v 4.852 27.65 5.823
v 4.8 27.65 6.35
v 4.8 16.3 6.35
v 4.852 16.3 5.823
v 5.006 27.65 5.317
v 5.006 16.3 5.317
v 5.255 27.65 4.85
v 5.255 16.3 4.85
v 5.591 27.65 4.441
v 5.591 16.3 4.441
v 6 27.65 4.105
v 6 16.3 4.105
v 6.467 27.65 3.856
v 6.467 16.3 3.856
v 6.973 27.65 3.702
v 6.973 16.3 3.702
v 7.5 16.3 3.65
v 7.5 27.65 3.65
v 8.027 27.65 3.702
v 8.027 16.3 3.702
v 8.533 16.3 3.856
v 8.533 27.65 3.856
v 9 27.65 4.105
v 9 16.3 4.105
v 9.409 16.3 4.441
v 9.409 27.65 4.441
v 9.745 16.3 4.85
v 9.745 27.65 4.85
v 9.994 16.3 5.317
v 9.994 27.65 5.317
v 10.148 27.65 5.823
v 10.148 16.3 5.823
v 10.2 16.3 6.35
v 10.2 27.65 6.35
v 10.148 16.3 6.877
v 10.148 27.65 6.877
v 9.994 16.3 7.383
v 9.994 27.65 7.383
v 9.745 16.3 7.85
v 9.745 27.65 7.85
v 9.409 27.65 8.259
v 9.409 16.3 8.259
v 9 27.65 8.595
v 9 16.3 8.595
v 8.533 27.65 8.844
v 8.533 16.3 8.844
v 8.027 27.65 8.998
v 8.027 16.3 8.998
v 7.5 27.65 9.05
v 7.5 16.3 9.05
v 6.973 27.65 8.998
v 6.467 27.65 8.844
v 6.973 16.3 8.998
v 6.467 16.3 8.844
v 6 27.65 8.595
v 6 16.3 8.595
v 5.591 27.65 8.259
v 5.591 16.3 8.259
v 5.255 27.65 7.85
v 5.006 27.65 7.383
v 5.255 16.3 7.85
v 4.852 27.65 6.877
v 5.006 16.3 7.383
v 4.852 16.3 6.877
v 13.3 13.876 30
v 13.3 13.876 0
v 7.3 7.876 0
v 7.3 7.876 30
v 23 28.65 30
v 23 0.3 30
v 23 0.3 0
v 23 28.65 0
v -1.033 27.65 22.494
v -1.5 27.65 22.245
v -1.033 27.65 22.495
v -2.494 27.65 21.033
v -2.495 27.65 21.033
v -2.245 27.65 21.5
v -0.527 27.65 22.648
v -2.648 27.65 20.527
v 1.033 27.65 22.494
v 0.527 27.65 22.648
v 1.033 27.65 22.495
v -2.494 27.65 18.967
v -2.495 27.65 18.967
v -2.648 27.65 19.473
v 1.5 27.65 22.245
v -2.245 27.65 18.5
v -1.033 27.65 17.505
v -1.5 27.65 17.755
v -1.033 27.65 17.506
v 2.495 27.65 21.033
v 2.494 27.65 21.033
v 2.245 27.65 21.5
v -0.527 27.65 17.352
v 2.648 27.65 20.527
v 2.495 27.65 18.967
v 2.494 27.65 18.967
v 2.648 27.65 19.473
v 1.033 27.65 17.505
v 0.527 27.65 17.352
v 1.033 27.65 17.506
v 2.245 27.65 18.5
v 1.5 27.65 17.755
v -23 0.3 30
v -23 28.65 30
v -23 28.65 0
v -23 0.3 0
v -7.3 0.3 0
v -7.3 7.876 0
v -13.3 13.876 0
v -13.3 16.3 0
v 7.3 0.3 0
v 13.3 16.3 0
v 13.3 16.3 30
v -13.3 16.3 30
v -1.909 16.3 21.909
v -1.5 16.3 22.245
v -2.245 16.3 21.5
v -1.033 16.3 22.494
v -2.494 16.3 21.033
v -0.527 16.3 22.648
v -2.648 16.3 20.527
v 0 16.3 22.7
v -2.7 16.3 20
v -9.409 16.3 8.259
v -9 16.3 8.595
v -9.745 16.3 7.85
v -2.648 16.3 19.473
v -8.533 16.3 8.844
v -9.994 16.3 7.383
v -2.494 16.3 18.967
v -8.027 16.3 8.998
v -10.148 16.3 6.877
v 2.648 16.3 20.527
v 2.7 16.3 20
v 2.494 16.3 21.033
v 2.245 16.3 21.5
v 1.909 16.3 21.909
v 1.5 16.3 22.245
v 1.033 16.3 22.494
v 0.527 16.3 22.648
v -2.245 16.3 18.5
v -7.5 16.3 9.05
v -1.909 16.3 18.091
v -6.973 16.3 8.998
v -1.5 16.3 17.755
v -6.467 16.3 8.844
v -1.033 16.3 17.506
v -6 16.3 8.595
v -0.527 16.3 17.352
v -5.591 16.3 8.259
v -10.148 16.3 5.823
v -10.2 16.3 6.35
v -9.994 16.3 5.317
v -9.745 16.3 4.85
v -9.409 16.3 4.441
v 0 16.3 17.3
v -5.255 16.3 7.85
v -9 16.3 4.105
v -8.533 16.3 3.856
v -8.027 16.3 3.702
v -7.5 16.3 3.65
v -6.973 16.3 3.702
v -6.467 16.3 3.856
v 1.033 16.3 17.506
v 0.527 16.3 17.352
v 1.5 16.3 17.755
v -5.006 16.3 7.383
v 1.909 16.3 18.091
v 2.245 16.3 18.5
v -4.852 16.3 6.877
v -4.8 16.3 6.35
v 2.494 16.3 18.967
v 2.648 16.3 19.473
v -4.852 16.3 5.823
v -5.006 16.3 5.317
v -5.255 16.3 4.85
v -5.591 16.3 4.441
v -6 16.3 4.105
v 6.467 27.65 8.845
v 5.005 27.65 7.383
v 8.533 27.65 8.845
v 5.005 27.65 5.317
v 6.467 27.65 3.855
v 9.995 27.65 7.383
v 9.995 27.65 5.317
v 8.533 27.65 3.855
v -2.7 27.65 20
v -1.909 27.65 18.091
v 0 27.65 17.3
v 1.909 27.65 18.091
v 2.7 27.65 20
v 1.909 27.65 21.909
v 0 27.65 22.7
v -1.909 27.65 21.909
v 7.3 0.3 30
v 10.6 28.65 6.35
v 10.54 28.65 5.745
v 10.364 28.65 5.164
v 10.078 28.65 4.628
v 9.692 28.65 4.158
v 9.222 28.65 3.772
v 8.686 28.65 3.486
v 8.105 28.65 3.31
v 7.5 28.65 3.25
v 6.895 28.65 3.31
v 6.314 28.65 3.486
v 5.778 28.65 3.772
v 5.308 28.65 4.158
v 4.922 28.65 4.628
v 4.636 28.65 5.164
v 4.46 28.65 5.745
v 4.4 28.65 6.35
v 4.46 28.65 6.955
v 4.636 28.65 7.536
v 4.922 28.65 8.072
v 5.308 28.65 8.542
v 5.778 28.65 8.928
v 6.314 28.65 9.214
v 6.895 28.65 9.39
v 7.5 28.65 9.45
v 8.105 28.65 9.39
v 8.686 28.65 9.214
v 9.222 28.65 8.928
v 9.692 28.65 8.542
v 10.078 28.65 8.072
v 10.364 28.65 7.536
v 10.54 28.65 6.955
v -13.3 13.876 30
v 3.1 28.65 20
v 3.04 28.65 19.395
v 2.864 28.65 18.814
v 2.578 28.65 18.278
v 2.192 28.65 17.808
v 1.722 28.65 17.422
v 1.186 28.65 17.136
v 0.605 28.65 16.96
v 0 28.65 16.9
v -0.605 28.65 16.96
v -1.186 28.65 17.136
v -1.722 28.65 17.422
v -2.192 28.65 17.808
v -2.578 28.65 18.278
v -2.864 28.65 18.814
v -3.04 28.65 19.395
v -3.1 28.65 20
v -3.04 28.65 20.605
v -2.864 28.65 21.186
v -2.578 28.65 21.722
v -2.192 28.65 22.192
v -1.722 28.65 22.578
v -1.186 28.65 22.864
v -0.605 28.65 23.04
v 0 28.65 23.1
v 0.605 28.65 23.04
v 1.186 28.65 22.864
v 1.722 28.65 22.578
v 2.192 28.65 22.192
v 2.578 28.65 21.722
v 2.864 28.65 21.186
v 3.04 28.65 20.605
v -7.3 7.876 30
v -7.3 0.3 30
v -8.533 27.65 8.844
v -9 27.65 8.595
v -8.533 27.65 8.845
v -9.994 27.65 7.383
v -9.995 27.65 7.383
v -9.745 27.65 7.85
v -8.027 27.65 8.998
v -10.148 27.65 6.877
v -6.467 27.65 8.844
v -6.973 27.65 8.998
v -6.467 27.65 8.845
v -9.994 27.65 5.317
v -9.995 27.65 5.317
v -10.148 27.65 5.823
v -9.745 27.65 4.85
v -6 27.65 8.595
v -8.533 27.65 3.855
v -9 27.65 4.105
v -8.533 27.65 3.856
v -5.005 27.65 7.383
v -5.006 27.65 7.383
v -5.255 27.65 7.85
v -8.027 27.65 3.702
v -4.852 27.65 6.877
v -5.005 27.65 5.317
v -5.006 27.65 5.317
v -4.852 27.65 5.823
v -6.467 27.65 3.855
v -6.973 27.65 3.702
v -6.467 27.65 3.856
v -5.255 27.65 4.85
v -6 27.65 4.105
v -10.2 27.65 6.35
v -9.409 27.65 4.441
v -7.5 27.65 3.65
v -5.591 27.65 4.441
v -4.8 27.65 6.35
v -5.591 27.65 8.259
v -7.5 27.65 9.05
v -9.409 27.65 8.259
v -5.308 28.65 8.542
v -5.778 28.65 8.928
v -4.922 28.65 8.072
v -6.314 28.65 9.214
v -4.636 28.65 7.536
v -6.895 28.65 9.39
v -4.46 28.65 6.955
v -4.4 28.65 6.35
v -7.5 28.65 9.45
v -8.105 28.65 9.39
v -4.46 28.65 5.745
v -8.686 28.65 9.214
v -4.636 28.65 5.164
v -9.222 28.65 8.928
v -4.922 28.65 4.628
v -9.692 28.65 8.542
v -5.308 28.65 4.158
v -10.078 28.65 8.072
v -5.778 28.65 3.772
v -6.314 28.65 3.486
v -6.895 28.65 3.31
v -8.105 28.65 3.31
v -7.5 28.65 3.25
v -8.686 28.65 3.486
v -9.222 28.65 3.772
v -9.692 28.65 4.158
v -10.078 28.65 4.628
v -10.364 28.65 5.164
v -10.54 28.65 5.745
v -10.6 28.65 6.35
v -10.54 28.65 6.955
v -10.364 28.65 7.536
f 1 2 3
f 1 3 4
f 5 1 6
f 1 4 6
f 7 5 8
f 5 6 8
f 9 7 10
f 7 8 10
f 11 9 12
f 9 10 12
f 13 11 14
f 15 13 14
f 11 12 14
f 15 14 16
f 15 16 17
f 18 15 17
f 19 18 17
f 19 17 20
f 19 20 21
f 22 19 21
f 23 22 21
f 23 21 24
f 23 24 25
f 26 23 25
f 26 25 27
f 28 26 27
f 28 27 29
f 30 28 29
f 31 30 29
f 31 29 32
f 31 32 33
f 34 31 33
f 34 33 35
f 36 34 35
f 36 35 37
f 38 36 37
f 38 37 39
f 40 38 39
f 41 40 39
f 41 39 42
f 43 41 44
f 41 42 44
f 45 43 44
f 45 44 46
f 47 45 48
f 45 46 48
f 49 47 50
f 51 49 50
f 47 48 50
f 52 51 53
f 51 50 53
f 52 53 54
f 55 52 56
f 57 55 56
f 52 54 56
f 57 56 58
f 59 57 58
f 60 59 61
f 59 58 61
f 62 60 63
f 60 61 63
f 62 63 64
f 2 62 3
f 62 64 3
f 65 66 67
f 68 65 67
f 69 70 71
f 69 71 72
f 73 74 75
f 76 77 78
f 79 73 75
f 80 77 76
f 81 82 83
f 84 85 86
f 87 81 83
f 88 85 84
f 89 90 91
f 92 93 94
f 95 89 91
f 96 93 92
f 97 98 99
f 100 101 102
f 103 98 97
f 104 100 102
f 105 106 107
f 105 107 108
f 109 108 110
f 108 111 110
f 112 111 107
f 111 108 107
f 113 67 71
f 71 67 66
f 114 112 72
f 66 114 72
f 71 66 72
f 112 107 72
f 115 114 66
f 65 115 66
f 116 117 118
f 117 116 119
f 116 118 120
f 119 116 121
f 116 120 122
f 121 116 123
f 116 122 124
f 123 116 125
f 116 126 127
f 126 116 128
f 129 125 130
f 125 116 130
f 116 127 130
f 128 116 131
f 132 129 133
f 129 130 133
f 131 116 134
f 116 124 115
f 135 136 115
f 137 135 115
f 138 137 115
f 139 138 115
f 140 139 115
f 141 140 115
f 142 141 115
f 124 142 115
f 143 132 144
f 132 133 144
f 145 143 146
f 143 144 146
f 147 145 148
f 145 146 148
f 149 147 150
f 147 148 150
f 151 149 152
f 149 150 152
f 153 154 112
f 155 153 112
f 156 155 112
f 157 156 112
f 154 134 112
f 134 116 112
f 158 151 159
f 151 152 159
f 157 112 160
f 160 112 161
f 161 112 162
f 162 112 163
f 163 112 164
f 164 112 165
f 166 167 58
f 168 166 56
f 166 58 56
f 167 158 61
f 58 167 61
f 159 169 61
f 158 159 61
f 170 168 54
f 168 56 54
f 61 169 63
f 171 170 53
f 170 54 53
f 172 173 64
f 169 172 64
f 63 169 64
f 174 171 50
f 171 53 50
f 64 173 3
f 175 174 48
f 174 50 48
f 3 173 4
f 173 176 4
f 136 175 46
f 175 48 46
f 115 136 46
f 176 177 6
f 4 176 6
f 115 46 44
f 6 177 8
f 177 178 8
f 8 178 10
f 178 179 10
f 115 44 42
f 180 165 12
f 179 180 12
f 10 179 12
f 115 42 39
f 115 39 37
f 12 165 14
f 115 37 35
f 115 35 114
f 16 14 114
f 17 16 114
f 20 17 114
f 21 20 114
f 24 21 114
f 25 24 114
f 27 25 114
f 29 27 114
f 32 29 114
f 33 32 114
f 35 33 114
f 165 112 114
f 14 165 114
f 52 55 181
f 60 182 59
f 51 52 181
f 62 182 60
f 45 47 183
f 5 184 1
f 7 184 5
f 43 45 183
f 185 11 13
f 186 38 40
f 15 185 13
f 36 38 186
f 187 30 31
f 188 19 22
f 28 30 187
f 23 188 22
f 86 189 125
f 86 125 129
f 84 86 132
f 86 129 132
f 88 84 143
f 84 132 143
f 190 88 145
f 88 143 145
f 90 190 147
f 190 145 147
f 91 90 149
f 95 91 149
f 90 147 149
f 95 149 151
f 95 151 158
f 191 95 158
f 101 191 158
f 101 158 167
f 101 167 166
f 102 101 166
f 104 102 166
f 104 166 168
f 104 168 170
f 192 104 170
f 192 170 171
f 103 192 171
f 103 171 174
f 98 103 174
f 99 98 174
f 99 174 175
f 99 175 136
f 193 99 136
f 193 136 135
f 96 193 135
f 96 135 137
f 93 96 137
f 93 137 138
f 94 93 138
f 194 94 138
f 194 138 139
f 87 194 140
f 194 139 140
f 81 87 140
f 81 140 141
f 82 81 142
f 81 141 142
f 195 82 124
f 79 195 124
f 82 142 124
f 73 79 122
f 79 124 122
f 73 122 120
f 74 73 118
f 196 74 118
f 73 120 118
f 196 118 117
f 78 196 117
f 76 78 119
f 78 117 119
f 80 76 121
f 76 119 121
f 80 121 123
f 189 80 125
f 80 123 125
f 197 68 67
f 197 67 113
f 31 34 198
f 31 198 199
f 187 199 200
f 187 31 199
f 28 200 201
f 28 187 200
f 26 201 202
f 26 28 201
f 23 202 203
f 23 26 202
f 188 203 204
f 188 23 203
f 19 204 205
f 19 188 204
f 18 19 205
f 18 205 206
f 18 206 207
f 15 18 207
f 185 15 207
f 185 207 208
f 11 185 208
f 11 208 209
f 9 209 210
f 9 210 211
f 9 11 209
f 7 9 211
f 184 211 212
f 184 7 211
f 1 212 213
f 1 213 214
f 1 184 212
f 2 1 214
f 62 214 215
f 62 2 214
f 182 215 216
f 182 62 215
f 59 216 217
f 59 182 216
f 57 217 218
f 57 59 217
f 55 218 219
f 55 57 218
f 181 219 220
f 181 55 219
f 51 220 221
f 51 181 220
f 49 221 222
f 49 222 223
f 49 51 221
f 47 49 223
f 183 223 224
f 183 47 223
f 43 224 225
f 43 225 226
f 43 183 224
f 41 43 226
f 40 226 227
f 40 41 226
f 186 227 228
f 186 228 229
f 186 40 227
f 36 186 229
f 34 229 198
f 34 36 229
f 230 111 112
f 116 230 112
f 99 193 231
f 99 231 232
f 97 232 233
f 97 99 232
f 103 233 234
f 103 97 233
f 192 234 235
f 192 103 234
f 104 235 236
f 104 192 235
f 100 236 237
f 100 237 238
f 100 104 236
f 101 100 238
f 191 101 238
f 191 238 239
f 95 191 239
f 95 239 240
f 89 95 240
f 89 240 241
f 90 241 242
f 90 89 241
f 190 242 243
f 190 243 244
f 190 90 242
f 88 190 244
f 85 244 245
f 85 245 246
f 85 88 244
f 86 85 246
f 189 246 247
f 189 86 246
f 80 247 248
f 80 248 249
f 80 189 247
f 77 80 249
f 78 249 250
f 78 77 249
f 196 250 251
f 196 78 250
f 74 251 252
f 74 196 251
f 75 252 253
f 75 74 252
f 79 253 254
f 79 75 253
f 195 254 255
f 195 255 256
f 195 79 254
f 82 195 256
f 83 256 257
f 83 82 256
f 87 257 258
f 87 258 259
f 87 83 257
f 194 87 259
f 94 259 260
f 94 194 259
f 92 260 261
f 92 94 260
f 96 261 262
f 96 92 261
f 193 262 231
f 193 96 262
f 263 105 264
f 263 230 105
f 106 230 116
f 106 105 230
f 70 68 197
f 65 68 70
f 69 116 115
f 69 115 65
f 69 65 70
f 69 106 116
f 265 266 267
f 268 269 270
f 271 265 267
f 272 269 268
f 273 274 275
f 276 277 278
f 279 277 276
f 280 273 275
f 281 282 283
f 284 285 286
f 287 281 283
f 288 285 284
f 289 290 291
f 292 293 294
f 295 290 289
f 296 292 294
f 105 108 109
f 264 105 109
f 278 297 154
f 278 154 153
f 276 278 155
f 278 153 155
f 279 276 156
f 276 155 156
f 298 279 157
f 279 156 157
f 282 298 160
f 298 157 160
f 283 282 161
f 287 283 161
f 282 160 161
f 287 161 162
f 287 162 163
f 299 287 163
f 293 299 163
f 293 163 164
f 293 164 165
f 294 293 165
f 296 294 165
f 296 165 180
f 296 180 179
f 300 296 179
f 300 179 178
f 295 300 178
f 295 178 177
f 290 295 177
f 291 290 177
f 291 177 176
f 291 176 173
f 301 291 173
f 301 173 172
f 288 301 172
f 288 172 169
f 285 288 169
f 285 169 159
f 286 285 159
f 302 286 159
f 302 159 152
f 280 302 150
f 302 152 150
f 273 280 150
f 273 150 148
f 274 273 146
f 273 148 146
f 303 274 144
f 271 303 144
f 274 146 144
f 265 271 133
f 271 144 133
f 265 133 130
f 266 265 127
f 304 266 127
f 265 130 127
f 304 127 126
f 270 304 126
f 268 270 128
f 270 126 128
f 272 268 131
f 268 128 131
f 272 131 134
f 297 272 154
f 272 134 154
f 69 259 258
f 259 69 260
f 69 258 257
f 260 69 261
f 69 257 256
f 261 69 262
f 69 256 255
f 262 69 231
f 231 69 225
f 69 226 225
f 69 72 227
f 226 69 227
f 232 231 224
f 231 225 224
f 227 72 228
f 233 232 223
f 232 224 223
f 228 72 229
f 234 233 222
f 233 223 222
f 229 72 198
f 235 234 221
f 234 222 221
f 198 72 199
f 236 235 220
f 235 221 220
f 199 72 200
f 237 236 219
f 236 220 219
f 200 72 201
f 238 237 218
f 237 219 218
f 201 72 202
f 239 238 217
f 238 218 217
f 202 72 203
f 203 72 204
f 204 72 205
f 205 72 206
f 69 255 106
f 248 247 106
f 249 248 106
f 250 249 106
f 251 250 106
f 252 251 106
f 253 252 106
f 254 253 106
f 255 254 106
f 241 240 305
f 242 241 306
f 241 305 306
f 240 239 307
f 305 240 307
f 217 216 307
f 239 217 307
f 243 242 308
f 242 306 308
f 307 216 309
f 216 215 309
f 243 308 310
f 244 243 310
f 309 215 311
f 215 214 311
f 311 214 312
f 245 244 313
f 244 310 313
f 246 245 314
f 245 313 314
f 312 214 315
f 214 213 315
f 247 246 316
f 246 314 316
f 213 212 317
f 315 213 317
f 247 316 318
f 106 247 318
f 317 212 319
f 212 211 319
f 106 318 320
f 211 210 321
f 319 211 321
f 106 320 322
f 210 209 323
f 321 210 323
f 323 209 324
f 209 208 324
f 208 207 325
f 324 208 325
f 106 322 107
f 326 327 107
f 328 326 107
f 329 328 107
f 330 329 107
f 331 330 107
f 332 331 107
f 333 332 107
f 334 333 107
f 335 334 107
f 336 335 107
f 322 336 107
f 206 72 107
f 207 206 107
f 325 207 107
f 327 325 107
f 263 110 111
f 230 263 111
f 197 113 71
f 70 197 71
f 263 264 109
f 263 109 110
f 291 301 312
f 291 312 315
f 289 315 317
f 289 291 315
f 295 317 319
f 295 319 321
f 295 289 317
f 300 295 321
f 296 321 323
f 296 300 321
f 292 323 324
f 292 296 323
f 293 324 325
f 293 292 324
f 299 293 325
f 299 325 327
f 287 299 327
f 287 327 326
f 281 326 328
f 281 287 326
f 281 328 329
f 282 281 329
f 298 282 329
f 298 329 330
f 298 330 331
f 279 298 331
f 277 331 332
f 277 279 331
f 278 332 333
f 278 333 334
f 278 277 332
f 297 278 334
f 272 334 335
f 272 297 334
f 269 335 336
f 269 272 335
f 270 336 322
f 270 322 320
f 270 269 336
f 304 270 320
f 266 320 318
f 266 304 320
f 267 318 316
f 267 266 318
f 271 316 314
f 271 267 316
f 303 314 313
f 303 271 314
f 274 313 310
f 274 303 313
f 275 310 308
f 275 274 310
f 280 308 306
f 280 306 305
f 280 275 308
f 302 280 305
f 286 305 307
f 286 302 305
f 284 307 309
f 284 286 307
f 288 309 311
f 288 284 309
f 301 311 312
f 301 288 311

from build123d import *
from OCP.BRepFilletAPI import BRepFilletAPI_MakeChamfer

# Parameters (mm, degrees)
BOSS_EXTRUDE1_DEPTH = 30
HOLE1_D             = 5.4
HOLE1_DEPTH         = 12.35
HOLE1_CBORE_D       = 6.2
HOLE1_CBORE_DEPTH   = 1
CHAMFER1_SIZE       = 1
CHAMFER1_SIZE_2     = 0.4


with BuildPart() as part:
    # Sketch1 → Boss-Extrude1 (new body)
    with BuildSketch(Plane.XY):
        Polygon((-7.3, 0.3), (-7.3, 7.875735931), (-13.3, 13.875735931), (-13.3, 16.3), (13.3, 16.3), (13.3, 13.875735931), (7.3, 7.875735931), (7.3, 0.3), (23, 0.3), (23, 28.65), (-23, 28.65), (-23, 0.3), align=None)
    extrude(amount=BOSS_EXTRUDE1_DEPTH)

    # Hole1
    with Locations(Plane(origin=(0, 28.65, 0), x_dir=(1, 0, 0), z_dir=(0, 1, 0))):
        with Locations((-7.5, -6.35), (7.5, -6.35), (0, -20)):
            CounterBoreHole(HOLE1_D / 2, HOLE1_CBORE_D / 2, HOLE1_CBORE_DEPTH, depth=HOLE1_DEPTH)

    # Chamfer1
    chamfer1_edges_1 = [part.edges().sort_by_distance(p)[0] for p in [
        (-3.1, 27.65, 20),
    ]]
    chamfer1_side_1 = [part.faces().sort_by_distance(p)[0] for p in [
        (-3.1, 27.658, 20),
    ]]
    chamfer1_edges_2 = [part.edges().sort_by_distance(p)[0] for p in [
        (4.4, 27.65, 6.35),
    ]]
    chamfer1_side_2 = [part.faces().sort_by_distance(p)[0] for p in [
        (4.4, 27.658, 6.35),
    ]]
    chamfer1_edges_3 = [part.edges().sort_by_distance(p)[0] for p in [
        (-10.6, 27.65, 6.35),
    ]]
    chamfer1_side_3 = [part.faces().sort_by_distance(p)[0] for p in [
        (-10.6, 27.658, 6.35),
    ]]
    chamfer1 = BRepFilletAPI_MakeChamfer(part.part.solid().wrapped)
    for e in chamfer1_edges_1:
        chamfer1.Add(CHAMFER1_SIZE - 0.0001, CHAMFER1_SIZE_2 - 0.0001, e.wrapped, chamfer1_side_1[0].wrapped)
    for e in chamfer1_edges_2:
        chamfer1.Add(CHAMFER1_SIZE - 0.0001, CHAMFER1_SIZE_2 - 0.0001, e.wrapped, chamfer1_side_2[0].wrapped)
    for e in chamfer1_edges_3:
        chamfer1.Add(CHAMFER1_SIZE - 0.0001, CHAMFER1_SIZE_2 - 0.0001, e.wrapped, chamfer1_side_3[0].wrapped)
    add(Compound.cast(chamfer1.Shape()), mode=Mode.REPLACE)  # a hair under: the kernel refuses the full size


solid = part.part
